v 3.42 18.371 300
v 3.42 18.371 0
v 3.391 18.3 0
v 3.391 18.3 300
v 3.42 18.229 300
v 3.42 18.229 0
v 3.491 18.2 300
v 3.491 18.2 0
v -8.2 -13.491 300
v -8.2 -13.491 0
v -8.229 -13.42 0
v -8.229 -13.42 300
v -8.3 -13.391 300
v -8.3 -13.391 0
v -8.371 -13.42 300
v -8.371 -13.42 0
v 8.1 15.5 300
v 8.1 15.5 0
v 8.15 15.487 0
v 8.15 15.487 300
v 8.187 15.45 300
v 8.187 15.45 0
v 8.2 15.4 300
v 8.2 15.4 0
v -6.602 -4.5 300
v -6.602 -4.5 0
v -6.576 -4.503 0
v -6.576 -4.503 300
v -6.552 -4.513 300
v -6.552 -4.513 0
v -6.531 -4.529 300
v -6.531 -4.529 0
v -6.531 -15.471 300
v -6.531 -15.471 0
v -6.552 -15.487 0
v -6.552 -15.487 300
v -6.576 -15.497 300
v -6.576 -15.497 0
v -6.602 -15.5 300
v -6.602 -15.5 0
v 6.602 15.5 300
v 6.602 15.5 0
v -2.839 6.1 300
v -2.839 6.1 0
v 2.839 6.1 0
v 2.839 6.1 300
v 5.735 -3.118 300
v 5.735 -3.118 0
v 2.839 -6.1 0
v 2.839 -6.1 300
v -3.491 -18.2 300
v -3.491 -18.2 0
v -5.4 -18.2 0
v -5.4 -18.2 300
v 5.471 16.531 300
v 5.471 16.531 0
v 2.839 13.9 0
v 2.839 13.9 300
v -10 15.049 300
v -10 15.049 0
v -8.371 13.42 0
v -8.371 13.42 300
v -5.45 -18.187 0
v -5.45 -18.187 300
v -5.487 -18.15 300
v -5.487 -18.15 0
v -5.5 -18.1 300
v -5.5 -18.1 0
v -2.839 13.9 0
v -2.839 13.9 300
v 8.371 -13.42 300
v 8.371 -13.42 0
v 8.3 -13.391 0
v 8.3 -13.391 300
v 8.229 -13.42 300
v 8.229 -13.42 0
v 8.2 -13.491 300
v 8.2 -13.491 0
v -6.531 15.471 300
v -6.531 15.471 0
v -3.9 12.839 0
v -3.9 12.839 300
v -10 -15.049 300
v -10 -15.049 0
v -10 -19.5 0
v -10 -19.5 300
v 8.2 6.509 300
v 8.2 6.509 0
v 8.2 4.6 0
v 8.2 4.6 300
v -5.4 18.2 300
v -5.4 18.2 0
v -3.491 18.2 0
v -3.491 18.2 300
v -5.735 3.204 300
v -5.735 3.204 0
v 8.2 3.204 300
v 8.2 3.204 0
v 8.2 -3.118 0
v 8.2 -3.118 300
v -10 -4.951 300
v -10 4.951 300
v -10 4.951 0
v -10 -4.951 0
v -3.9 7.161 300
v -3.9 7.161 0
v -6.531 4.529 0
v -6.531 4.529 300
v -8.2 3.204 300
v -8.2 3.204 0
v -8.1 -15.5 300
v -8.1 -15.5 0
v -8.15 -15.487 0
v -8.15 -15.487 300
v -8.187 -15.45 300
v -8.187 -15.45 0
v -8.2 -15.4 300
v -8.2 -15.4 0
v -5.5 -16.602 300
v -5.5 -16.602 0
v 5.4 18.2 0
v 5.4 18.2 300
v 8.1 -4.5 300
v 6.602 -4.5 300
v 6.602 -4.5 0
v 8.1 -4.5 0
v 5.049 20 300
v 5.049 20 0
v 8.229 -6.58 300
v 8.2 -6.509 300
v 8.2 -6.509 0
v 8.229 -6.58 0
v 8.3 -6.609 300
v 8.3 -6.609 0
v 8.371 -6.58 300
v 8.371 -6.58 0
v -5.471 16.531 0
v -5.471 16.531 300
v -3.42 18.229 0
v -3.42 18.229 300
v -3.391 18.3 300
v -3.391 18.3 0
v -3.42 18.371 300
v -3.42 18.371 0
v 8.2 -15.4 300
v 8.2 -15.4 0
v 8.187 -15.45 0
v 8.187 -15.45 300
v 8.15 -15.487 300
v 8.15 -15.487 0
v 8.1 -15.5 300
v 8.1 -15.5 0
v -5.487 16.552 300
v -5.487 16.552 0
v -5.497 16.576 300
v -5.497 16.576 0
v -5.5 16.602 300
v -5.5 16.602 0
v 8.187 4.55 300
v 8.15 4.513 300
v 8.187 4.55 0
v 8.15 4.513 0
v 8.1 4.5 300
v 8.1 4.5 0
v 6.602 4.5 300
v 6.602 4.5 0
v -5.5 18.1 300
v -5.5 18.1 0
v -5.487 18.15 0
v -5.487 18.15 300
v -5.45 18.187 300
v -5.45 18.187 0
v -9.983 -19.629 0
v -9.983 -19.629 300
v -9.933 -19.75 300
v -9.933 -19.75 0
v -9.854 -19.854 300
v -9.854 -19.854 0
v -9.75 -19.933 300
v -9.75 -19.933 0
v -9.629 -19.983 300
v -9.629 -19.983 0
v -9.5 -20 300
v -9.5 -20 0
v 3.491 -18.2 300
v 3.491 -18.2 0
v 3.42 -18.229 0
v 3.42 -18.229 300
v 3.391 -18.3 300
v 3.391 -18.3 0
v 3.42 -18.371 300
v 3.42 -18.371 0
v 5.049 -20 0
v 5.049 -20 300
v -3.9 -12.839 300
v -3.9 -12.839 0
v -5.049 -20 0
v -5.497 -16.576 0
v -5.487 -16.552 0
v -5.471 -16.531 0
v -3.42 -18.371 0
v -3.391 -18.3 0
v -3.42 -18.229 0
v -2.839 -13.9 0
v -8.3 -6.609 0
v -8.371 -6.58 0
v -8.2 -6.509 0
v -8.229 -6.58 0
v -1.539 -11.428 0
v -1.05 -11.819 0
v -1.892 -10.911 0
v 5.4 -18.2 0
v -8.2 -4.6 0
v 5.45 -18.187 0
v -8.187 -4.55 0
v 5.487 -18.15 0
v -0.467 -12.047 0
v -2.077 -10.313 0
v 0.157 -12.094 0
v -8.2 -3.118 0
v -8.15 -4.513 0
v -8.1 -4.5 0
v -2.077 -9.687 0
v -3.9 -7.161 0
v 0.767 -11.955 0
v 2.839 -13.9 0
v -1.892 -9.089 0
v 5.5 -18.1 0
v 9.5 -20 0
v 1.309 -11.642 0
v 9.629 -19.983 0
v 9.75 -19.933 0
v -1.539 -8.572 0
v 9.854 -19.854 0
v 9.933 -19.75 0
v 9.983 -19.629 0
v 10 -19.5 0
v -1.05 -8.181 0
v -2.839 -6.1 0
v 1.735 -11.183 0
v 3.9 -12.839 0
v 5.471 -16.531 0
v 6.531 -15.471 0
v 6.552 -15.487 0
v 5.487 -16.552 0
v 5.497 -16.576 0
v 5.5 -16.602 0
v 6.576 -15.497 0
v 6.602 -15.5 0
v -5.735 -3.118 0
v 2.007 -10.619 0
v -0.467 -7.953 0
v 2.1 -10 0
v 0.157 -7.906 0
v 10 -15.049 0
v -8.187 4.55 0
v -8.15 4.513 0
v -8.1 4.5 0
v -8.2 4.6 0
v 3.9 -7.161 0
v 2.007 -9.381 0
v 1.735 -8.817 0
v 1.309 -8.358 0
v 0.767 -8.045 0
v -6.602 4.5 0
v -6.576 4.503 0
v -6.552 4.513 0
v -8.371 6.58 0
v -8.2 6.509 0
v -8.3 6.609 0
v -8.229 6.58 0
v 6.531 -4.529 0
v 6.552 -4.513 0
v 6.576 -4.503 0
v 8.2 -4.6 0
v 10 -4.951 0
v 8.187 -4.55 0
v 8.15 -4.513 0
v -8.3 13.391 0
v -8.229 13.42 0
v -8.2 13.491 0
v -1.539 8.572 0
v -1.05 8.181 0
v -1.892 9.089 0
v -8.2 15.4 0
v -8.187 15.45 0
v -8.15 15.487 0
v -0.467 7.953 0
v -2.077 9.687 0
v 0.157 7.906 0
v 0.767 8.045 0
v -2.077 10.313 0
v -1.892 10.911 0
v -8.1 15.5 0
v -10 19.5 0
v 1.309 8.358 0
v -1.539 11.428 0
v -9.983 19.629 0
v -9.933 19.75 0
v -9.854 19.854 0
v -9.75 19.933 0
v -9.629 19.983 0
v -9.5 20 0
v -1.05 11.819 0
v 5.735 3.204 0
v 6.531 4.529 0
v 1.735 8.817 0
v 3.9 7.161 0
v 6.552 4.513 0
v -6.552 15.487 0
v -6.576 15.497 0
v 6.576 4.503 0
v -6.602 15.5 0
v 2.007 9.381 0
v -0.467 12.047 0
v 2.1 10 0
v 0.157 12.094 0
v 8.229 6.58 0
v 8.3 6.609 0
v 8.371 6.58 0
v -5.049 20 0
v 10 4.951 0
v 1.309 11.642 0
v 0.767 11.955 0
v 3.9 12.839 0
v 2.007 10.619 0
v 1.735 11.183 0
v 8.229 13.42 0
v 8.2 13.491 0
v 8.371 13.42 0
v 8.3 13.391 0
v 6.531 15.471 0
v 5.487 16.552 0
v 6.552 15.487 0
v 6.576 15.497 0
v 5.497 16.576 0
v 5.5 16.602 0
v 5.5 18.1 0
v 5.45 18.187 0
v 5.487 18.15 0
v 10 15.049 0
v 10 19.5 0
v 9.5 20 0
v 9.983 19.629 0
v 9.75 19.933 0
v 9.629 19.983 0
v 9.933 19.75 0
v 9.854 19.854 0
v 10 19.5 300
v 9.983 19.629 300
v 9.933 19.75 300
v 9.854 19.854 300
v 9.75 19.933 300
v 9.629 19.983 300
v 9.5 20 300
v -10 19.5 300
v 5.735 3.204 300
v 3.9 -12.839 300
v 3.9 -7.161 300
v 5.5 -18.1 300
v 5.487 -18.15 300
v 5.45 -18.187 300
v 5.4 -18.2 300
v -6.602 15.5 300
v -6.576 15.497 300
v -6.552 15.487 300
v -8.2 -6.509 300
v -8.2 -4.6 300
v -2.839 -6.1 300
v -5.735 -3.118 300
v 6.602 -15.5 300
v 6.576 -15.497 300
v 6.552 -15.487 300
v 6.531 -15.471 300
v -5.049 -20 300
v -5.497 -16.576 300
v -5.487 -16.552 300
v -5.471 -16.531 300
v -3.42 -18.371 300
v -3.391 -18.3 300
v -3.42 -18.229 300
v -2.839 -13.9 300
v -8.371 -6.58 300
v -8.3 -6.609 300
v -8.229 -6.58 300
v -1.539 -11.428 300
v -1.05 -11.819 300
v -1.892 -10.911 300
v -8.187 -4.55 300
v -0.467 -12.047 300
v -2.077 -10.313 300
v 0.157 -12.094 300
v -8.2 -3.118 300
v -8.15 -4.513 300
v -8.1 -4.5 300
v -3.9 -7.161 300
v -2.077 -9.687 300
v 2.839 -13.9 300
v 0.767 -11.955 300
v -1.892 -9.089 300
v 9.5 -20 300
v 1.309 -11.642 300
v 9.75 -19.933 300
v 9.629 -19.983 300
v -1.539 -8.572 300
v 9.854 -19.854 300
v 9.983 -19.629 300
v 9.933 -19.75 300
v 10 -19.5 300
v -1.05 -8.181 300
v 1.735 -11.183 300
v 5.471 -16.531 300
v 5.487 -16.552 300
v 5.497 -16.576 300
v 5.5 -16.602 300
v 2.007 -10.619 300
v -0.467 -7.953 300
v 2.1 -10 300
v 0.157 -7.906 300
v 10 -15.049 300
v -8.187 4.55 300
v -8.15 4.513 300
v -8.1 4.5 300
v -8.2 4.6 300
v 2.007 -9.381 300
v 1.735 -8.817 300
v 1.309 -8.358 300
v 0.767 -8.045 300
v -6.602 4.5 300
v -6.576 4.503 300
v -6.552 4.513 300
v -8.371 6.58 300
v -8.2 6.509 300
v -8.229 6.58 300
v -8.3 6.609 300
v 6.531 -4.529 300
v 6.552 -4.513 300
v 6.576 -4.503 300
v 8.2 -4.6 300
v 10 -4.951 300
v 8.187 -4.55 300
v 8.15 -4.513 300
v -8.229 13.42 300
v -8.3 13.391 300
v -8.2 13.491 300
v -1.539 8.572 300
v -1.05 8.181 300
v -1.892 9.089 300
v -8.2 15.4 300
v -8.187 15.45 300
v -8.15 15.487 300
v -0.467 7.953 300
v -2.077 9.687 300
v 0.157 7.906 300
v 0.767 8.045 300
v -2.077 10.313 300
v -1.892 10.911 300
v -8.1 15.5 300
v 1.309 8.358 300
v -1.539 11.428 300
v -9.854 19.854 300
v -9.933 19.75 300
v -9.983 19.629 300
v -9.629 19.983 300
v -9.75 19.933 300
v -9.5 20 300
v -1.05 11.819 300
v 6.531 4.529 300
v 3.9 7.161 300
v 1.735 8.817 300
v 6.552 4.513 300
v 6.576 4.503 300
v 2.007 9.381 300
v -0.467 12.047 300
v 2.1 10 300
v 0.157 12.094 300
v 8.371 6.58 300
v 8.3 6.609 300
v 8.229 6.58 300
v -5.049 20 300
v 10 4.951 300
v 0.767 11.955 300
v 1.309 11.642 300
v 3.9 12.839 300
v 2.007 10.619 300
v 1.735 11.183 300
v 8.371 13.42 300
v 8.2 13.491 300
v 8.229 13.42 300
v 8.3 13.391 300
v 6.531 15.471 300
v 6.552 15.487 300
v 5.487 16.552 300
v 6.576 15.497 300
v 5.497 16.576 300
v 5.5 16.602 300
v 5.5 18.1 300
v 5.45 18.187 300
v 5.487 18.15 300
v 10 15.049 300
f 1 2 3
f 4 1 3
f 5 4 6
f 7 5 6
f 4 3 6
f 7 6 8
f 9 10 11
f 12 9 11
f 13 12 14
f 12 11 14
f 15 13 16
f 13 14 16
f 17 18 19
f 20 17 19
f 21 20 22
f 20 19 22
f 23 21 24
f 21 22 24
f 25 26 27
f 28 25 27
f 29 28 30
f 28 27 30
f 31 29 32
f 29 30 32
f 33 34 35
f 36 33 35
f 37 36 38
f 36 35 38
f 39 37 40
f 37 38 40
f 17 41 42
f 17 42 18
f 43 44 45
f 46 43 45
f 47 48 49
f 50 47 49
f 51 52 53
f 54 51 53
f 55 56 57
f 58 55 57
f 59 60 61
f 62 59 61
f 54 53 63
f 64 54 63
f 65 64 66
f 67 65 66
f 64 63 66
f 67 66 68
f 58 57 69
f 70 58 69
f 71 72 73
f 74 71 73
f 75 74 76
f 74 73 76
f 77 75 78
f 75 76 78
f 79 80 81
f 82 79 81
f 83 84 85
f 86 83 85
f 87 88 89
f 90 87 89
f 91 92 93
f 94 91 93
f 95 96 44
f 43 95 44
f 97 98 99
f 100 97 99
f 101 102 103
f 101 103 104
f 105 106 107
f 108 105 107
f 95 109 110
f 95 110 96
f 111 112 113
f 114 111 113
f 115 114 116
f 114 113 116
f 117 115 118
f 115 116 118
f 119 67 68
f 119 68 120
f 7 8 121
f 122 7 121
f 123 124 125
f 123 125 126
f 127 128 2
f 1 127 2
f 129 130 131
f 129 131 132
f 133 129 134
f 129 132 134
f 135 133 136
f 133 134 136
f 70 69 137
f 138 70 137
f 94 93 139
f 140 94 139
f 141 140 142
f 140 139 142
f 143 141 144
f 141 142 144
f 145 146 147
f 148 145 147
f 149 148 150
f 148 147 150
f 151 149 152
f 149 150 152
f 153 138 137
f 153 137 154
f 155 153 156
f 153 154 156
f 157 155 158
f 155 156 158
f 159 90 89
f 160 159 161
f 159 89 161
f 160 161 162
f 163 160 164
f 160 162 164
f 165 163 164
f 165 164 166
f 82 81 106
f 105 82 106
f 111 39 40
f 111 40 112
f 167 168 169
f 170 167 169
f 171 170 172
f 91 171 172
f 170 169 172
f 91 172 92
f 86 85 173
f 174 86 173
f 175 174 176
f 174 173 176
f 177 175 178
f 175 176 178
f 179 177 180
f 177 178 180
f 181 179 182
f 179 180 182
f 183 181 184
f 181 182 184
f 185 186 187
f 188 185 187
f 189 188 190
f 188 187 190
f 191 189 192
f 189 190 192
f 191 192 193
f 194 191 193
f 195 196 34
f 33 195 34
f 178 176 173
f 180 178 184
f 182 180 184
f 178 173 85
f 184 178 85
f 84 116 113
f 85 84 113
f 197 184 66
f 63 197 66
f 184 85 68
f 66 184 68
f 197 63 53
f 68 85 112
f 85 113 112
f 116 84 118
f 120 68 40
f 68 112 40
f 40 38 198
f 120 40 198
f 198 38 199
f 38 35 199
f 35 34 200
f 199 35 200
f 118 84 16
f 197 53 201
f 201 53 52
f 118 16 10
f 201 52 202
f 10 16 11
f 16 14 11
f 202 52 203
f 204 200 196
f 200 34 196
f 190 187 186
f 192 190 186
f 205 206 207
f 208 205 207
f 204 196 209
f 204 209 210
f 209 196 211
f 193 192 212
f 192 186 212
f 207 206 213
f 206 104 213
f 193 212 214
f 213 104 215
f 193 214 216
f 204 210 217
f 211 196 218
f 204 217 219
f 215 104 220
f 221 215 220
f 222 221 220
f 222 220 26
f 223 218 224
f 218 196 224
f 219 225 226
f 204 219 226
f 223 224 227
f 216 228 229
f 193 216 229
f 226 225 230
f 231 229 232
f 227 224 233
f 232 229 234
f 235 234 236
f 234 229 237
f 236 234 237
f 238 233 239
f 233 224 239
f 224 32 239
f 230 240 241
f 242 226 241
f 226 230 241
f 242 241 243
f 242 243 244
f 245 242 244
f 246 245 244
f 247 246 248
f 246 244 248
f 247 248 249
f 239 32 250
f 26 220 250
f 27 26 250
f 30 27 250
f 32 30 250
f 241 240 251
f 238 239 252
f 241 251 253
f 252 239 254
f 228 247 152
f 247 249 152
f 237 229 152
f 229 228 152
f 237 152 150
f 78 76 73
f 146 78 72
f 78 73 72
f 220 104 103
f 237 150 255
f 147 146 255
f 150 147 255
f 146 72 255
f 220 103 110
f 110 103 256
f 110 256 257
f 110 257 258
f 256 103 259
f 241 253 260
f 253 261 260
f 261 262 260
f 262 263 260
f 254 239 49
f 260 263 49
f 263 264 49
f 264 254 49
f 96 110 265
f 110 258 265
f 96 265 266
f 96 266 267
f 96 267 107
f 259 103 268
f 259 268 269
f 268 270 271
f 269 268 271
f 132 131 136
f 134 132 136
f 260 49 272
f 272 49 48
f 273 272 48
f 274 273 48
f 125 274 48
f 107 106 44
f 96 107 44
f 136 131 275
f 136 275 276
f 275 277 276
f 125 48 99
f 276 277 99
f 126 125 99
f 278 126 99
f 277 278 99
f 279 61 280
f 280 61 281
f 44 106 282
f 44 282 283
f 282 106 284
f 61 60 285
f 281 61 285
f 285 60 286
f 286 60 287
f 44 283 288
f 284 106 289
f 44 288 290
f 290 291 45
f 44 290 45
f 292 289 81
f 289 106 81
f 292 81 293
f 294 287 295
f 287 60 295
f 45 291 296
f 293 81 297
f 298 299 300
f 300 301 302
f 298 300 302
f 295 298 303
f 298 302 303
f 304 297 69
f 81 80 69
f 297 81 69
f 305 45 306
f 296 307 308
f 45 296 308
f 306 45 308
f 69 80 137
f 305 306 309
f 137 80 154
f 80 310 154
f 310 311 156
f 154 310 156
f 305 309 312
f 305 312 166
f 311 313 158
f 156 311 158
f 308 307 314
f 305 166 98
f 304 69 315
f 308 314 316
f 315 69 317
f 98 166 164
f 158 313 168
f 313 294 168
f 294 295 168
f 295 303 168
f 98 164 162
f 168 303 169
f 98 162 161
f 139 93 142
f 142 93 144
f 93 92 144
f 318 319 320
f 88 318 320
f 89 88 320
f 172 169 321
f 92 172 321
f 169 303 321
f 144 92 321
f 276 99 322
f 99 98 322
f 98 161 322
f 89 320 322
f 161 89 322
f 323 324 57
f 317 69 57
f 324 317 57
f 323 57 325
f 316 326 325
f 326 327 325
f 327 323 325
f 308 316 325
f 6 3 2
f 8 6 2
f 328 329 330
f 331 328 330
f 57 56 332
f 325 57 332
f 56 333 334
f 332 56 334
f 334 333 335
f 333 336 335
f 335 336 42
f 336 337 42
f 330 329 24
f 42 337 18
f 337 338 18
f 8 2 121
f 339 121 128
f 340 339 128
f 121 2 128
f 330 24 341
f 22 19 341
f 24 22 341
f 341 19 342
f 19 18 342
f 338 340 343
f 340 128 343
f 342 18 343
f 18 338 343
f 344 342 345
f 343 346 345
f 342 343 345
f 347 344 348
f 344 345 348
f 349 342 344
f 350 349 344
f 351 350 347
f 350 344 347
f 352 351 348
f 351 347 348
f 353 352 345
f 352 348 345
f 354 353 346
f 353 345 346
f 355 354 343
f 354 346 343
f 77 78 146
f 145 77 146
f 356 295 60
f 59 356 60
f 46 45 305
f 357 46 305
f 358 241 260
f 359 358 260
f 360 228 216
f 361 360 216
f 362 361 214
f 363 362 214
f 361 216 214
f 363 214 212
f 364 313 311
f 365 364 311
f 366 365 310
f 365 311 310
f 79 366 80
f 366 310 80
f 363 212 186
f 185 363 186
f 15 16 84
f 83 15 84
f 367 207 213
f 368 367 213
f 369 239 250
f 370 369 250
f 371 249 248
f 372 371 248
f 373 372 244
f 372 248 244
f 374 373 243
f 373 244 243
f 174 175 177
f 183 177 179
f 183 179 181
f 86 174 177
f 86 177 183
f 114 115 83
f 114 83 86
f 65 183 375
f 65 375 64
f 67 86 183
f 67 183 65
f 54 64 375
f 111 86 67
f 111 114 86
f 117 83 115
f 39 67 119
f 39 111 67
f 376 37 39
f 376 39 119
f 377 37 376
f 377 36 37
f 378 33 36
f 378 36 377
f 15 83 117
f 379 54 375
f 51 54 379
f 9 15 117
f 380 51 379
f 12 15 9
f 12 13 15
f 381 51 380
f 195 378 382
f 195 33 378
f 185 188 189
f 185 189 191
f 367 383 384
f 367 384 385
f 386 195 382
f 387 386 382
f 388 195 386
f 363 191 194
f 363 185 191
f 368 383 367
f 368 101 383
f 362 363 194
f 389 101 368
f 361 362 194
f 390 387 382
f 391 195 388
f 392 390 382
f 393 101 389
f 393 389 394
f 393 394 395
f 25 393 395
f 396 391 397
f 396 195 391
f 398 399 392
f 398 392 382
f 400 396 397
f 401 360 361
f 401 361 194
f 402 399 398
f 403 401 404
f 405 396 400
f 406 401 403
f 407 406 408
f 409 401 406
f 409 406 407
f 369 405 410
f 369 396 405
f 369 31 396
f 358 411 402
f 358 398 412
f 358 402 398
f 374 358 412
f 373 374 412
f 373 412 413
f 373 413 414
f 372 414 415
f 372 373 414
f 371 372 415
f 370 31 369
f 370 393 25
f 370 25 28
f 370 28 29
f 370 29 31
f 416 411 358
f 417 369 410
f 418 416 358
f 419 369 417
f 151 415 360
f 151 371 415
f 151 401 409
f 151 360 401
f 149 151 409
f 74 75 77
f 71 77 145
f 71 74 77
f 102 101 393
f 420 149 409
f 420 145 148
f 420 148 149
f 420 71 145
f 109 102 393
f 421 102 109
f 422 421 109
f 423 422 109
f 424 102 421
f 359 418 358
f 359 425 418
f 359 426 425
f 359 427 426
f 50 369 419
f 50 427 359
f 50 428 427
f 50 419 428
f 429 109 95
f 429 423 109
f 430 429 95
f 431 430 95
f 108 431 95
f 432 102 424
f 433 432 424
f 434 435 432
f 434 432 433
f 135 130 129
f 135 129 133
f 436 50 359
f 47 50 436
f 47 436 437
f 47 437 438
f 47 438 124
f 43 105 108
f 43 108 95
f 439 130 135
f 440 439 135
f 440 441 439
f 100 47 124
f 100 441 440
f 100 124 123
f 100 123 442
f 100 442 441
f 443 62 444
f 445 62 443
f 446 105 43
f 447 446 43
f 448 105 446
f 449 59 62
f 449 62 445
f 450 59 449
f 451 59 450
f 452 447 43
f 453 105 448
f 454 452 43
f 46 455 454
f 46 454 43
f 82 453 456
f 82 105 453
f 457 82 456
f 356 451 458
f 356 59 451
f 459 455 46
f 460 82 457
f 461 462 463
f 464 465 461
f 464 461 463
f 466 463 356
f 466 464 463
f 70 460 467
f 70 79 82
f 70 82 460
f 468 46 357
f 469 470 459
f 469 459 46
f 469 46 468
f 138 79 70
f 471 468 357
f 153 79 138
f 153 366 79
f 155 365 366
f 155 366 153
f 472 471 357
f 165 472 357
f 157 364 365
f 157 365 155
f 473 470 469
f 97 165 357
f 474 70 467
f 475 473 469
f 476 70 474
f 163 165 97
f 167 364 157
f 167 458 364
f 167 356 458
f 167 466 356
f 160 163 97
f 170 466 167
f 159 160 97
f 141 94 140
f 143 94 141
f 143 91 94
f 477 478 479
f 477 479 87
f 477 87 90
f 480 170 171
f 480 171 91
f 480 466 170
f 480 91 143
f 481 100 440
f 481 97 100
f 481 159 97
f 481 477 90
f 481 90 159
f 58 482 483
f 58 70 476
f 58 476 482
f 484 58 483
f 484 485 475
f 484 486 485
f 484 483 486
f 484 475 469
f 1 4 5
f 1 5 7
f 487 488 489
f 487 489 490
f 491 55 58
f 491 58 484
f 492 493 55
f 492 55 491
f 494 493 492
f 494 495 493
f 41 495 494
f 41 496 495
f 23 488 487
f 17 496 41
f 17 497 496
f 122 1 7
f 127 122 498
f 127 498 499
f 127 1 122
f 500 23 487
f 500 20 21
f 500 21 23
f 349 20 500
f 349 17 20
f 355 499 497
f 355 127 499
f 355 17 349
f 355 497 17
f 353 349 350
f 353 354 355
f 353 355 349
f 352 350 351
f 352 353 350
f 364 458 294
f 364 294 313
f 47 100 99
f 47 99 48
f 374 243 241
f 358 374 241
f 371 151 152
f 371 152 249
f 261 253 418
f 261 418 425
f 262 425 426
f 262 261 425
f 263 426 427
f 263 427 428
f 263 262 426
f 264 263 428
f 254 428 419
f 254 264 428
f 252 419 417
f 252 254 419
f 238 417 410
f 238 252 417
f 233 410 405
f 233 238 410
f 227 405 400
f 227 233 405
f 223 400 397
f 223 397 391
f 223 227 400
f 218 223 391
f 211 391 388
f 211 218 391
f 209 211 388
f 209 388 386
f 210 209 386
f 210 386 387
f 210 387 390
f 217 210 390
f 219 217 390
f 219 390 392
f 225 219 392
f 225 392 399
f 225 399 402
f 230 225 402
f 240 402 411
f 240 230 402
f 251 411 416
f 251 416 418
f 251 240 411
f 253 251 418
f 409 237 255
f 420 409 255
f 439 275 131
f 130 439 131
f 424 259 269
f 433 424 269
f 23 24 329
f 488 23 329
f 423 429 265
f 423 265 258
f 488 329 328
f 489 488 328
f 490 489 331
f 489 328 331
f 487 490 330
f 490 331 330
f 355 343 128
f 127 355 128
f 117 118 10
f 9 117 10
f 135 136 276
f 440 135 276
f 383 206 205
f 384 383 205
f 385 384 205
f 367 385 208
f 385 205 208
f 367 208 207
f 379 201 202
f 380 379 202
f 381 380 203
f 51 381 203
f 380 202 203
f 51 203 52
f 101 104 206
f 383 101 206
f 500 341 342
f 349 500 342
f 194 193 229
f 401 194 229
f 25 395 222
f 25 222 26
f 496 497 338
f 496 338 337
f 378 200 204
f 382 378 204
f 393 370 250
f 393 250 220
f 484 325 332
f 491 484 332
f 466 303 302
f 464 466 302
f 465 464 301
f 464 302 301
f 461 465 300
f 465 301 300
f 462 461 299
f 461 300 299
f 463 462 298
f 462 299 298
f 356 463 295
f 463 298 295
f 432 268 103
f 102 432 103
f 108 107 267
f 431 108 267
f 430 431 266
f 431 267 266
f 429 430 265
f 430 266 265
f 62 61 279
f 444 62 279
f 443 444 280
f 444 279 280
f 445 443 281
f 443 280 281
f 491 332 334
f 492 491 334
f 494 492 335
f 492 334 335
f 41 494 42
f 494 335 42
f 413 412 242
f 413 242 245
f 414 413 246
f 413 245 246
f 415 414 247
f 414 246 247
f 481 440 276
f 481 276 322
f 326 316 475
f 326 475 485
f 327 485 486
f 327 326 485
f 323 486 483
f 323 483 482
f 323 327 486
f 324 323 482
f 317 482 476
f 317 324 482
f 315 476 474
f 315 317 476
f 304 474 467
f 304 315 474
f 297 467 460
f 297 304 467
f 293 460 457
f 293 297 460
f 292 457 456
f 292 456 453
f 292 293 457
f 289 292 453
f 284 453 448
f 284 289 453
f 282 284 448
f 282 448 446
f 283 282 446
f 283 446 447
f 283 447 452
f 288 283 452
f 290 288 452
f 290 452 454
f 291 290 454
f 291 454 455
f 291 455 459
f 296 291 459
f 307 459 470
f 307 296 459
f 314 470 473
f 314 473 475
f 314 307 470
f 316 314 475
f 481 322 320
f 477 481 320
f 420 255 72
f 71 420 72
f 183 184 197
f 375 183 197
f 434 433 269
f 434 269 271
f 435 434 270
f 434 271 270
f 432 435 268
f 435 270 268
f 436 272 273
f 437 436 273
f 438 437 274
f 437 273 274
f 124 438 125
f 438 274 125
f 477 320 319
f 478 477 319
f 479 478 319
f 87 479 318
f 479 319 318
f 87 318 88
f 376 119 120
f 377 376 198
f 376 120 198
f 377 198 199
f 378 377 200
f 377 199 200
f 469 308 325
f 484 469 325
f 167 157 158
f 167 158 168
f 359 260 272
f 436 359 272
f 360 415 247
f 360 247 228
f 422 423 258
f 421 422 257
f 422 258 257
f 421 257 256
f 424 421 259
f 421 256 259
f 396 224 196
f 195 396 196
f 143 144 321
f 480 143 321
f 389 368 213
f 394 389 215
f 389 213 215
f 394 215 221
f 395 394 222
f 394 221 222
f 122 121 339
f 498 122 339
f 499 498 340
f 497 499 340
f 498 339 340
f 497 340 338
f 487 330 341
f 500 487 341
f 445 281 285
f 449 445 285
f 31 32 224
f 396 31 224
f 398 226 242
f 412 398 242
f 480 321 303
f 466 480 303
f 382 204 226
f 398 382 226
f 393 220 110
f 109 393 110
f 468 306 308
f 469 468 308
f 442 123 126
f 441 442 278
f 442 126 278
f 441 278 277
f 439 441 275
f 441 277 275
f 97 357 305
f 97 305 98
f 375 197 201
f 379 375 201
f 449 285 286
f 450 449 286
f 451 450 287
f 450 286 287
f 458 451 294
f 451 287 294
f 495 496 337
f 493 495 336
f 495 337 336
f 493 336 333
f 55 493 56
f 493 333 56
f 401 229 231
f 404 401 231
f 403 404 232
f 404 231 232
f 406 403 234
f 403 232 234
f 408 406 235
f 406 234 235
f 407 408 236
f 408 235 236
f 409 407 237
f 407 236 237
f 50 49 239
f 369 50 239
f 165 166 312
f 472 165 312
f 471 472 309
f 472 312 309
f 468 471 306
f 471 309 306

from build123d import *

# Parameters (mm, degrees)
SKETCH1_R           = 2.1
BOSS_EXTRUDE1_DEPTH = 300


with BuildPart() as part:
    # Sketch1 → Boss-Extrude1 (new body)
    with BuildSketch(Plane.XY):
        with BuildLine():
            ThreePointArc((10, 19.5), (9.853553391, 19.853553391), (9.5, 20))
            Line((9.5, 20), (5.049211356, 20))
            Line((5.049211356, 20), (3.419922035, 18.370710678))
            ThreePointArc((3.419922035, 18.370710678), (3.398244759, 18.261731657), (3.490632713, 18.2))
            Line((3.490632713, 18.2), (5.4, 18.2))
            ThreePointArc((5.4, 18.2), (5.470710678, 18.170710678), (5.5, 18.1))
            Line((5.5, 18.1), (5.5, 16.602081528))
            ThreePointArc((5.5, 16.602081528), (5.492387953, 16.563813185), (5.470710678, 16.53137085))
            Line((5.470710678, 16.53137085), (2.839339828, 13.9))
            Line((2.839339828, 13.9), (-2.839339828, 13.9))
            Line((-2.839339828, 13.9), (-5.470710678, 16.53137085))
            ThreePointArc((-5.470710678, 16.53137085), (-5.492387953, 16.563813185), (-5.5, 16.602081528))
            Line((-5.5, 16.602081528), (-5.5, 18.1))
            ThreePointArc((-5.5, 18.1), (-5.470710678, 18.170710678), (-5.4, 18.2))
            Line((-5.4, 18.2), (-3.490632713, 18.2))
            ThreePointArc((-3.490632713, 18.2), (-3.398244759, 18.261731657), (-3.419922035, 18.370710678))
            Line((-3.419922035, 18.370710678), (-5.049211356, 20))
            Line((-5.049211356, 20), (-9.5, 20))
            ThreePointArc((-9.5, 20), (-9.853553391, 19.853553391), (-10, 19.5))
            Line((-10, 19.5), (-10, 15.049211356))
            Line((-10, 15.049211356), (-8.370710678, 13.419922035))
            ThreePointArc((-8.370710678, 13.419922035), (-8.261731657, 13.398244759), (-8.2, 13.490632713))
            Line((-8.2, 13.490632713), (-8.2, 15.4))
            ThreePointArc((-8.2, 15.4), (-8.170710678, 15.470710678), (-8.1, 15.5))
            Line((-8.1, 15.5), (-6.602081528, 15.5))
            ThreePointArc((-6.602081528, 15.5), (-6.563813185, 15.492387953), (-6.53137085, 15.470710678))
            Line((-6.53137085, 15.470710678), (-3.9, 12.839339828))
            Line((-3.9, 12.839339828), (-3.9, 7.160660172))
            Line((-3.9, 7.160660172), (-6.53137085, 4.529289322))
            ThreePointArc((-6.53137085, 4.529289322), (-6.563813185, 4.507612047), (-6.602081528, 4.5))
            Line((-6.602081528, 4.5), (-8.1, 4.5))
            ThreePointArc((-8.1, 4.5), (-8.170710678, 4.529289322), (-8.2, 4.6))
            Line((-8.2, 4.6), (-8.2, 6.509367287))
            ThreePointArc((-8.2, 6.509367287), (-8.261731657, 6.601755241), (-8.370710678, 6.580077965))
            Line((-8.370710678, 6.580077965), (-10, 4.950788644))
            Line((-10, 4.950788644), (-10, -4.950788644))
            Line((-10, -4.950788644), (-8.370710678, -6.580077965))
            ThreePointArc((-8.370710678, -6.580077965), (-8.261731657, -6.601755241), (-8.2, -6.509367287))
            Line((-8.2, -6.509367287), (-8.2, -4.6))
            ThreePointArc((-8.2, -4.6), (-8.170710678, -4.529289322), (-8.1, -4.5))
            Line((-8.1, -4.5), (-6.602081528, -4.5))
            ThreePointArc((-6.602081528, -4.5), (-6.563813185, -4.507612047), (-6.53137085, -4.529289322))
            Line((-6.53137085, -4.529289322), (-3.9, -7.160660172))
            Line((-3.9, -7.160660172), (-3.9, -10))
            Line((-3.9, -10), (-3.9, -12.839339828))
            Line((-3.9, -12.839339828), (-6.53137085, -15.470710678))
            ThreePointArc((-6.53137085, -15.470710678), (-6.563813185, -15.492387953), (-6.602081528, -15.5))
            Line((-6.602081528, -15.5), (-8.1, -15.5))
            ThreePointArc((-8.1, -15.5), (-8.170710678, -15.470710678), (-8.2, -15.4))
            Line((-8.2, -15.4), (-8.2, -13.490632713))
            ThreePointArc((-8.2, -13.490632713), (-8.261731657, -13.398244759), (-8.370710678, -13.419922035))
            Line((-8.370710678, -13.419922035), (-10, -15.049211356))
            Line((-10, -15.049211356), (-10, -19.5))
            ThreePointArc((-10, -19.5), (-9.853553391, -19.853553391), (-9.5, -20))
            Line((-9.5, -20), (-5.049211356, -20))
            Line((-5.049211356, -20), (-3.419922035, -18.370710678))
            ThreePointArc((-3.419922035, -18.370710678), (-3.398244759, -18.261731657), (-3.490632713, -18.2))
            Line((-3.490632713, -18.2), (-5.4, -18.2))
            ThreePointArc((-5.4, -18.2), (-5.470710678, -18.170710678), (-5.5, -18.1))
            Line((-5.5, -18.1), (-5.5, -16.602081528))
            ThreePointArc((-5.5, -16.602081528), (-5.492387953, -16.563813185), (-5.470710678, -16.53137085))
            Line((-5.470710678, -16.53137085), (-2.839339828, -13.9))
            Line((-2.839339828, -13.9), (2.839339828, -13.9))
            Line((2.839339828, -13.9), (5.470710678, -16.53137085))
            ThreePointArc((5.470710678, -16.53137085), (5.492387953, -16.563813185), (5.5, -16.602081528))
            Line((5.5, -16.602081528), (5.5, -18.1))
            ThreePointArc((5.5, -18.1), (5.470710678, -18.170710678), (5.4, -18.2))
            Line((5.4, -18.2), (3.490632713, -18.2))
            ThreePointArc((3.490632713, -18.2), (3.398244759, -18.261731657), (3.419922035, -18.370710678))
            Line((3.419922035, -18.370710678), (5.049211356, -20))
            Line((5.049211356, -20), (9.5, -20))
            ThreePointArc((9.5, -20), (9.853553391, -19.853553391), (10, -19.5))
            Line((10, -19.5), (10, -15.049211356))
            Line((10, -15.049211356), (8.370710678, -13.419922035))
            ThreePointArc((8.370710678, -13.419922035), (8.261731657, -13.398244759), (8.2, -13.490632713))
            Line((8.2, -13.490632713), (8.2, -15.4))
            ThreePointArc((8.2, -15.4), (8.170710678, -15.470710678), (8.1, -15.5))
            Line((8.1, -15.5), (6.602081528, -15.5))
            ThreePointArc((6.602081528, -15.5), (6.563813185, -15.492387953), (6.53137085, -15.470710678))
            Line((6.53137085, -15.470710678), (3.9, -12.839339828))
            Line((3.9, -12.839339828), (3.9, -10))
            Line((3.9, -10), (3.9, -7.160660172))
            Line((3.9, -7.160660172), (6.53137085, -4.529289322))
            ThreePointArc((6.53137085, -4.529289322), (6.563813185, -4.507612047), (6.602081528, -4.5))
            Line((6.602081528, -4.5), (8.1, -4.5))
            ThreePointArc((8.1, -4.5), (8.170710678, -4.529289322), (8.2, -4.6))
            Line((8.2, -4.6), (8.2, -6.509367287))
            ThreePointArc((8.2, -6.509367287), (8.261731657, -6.601755241), (8.370710678, -6.580077965))
            Line((8.370710678, -6.580077965), (10, -4.950788644))
            Line((10, -4.950788644), (10, 4.950788644))
            Line((10, 4.950788644), (8.370710678, 6.580077965))
            ThreePointArc((8.370710678, 6.580077965), (8.261731657, 6.601755241), (8.2, 6.509367287))
            Line((8.2, 6.509367287), (8.2, 4.6))
            ThreePointArc((8.2, 4.6), (8.170710678, 4.529289322), (8.1, 4.5))
            Line((8.1, 4.5), (6.602081528, 4.5))
            ThreePointArc((6.602081528, 4.5), (6.563813185, 4.507612047), (6.53137085, 4.529289322))
            Line((6.53137085, 4.529289322), (3.9, 7.160660172))
            Line((3.9, 7.160660172), (3.9, 12.839339828))
            Line((3.9, 12.839339828), (6.53137085, 15.470710678))
            ThreePointArc((6.53137085, 15.470710678), (6.563813185, 15.492387953), (6.602081528, 15.5))
            Line((6.602081528, 15.5), (8.1, 15.5))
            ThreePointArc((8.1, 15.5), (8.170710678, 15.470710678), (8.2, 15.4))
            Line((8.2, 15.4), (8.2, 13.490632713))
            ThreePointArc((8.2, 13.490632713), (8.261731657, 13.398244759), (8.370710678, 13.419922035))
            Line((8.370710678, 13.419922035), (10, 15.049211356))
            Line((10, 15.049211356), (10, 19.5))
        make_face()
        with Locations((0, -10)):
            Circle(SKETCH1_R, mode=Mode.SUBTRACT)
        Polygon((-5.735302207, 3.204037621), (-2.839339828, 6.1), (2.839339828, 6.1), (5.735302207, 3.204037621), (8.2, 3.204037621), (8.2, -3.117547571), (5.735302207, -3.117547571), (2.839339828, -6.1), (-2.839339828, -6.1), (-5.735302207, -3.117547571), (-8.2, -3.117547571), (-8.2, 3.204037621), align=None, mode=Mode.SUBTRACT)
        with Locations((0, 10)):
            Circle(SKETCH1_R, mode=Mode.SUBTRACT)
    extrude(amount=BOSS_EXTRUDE1_DEPTH)


solid = part.part
